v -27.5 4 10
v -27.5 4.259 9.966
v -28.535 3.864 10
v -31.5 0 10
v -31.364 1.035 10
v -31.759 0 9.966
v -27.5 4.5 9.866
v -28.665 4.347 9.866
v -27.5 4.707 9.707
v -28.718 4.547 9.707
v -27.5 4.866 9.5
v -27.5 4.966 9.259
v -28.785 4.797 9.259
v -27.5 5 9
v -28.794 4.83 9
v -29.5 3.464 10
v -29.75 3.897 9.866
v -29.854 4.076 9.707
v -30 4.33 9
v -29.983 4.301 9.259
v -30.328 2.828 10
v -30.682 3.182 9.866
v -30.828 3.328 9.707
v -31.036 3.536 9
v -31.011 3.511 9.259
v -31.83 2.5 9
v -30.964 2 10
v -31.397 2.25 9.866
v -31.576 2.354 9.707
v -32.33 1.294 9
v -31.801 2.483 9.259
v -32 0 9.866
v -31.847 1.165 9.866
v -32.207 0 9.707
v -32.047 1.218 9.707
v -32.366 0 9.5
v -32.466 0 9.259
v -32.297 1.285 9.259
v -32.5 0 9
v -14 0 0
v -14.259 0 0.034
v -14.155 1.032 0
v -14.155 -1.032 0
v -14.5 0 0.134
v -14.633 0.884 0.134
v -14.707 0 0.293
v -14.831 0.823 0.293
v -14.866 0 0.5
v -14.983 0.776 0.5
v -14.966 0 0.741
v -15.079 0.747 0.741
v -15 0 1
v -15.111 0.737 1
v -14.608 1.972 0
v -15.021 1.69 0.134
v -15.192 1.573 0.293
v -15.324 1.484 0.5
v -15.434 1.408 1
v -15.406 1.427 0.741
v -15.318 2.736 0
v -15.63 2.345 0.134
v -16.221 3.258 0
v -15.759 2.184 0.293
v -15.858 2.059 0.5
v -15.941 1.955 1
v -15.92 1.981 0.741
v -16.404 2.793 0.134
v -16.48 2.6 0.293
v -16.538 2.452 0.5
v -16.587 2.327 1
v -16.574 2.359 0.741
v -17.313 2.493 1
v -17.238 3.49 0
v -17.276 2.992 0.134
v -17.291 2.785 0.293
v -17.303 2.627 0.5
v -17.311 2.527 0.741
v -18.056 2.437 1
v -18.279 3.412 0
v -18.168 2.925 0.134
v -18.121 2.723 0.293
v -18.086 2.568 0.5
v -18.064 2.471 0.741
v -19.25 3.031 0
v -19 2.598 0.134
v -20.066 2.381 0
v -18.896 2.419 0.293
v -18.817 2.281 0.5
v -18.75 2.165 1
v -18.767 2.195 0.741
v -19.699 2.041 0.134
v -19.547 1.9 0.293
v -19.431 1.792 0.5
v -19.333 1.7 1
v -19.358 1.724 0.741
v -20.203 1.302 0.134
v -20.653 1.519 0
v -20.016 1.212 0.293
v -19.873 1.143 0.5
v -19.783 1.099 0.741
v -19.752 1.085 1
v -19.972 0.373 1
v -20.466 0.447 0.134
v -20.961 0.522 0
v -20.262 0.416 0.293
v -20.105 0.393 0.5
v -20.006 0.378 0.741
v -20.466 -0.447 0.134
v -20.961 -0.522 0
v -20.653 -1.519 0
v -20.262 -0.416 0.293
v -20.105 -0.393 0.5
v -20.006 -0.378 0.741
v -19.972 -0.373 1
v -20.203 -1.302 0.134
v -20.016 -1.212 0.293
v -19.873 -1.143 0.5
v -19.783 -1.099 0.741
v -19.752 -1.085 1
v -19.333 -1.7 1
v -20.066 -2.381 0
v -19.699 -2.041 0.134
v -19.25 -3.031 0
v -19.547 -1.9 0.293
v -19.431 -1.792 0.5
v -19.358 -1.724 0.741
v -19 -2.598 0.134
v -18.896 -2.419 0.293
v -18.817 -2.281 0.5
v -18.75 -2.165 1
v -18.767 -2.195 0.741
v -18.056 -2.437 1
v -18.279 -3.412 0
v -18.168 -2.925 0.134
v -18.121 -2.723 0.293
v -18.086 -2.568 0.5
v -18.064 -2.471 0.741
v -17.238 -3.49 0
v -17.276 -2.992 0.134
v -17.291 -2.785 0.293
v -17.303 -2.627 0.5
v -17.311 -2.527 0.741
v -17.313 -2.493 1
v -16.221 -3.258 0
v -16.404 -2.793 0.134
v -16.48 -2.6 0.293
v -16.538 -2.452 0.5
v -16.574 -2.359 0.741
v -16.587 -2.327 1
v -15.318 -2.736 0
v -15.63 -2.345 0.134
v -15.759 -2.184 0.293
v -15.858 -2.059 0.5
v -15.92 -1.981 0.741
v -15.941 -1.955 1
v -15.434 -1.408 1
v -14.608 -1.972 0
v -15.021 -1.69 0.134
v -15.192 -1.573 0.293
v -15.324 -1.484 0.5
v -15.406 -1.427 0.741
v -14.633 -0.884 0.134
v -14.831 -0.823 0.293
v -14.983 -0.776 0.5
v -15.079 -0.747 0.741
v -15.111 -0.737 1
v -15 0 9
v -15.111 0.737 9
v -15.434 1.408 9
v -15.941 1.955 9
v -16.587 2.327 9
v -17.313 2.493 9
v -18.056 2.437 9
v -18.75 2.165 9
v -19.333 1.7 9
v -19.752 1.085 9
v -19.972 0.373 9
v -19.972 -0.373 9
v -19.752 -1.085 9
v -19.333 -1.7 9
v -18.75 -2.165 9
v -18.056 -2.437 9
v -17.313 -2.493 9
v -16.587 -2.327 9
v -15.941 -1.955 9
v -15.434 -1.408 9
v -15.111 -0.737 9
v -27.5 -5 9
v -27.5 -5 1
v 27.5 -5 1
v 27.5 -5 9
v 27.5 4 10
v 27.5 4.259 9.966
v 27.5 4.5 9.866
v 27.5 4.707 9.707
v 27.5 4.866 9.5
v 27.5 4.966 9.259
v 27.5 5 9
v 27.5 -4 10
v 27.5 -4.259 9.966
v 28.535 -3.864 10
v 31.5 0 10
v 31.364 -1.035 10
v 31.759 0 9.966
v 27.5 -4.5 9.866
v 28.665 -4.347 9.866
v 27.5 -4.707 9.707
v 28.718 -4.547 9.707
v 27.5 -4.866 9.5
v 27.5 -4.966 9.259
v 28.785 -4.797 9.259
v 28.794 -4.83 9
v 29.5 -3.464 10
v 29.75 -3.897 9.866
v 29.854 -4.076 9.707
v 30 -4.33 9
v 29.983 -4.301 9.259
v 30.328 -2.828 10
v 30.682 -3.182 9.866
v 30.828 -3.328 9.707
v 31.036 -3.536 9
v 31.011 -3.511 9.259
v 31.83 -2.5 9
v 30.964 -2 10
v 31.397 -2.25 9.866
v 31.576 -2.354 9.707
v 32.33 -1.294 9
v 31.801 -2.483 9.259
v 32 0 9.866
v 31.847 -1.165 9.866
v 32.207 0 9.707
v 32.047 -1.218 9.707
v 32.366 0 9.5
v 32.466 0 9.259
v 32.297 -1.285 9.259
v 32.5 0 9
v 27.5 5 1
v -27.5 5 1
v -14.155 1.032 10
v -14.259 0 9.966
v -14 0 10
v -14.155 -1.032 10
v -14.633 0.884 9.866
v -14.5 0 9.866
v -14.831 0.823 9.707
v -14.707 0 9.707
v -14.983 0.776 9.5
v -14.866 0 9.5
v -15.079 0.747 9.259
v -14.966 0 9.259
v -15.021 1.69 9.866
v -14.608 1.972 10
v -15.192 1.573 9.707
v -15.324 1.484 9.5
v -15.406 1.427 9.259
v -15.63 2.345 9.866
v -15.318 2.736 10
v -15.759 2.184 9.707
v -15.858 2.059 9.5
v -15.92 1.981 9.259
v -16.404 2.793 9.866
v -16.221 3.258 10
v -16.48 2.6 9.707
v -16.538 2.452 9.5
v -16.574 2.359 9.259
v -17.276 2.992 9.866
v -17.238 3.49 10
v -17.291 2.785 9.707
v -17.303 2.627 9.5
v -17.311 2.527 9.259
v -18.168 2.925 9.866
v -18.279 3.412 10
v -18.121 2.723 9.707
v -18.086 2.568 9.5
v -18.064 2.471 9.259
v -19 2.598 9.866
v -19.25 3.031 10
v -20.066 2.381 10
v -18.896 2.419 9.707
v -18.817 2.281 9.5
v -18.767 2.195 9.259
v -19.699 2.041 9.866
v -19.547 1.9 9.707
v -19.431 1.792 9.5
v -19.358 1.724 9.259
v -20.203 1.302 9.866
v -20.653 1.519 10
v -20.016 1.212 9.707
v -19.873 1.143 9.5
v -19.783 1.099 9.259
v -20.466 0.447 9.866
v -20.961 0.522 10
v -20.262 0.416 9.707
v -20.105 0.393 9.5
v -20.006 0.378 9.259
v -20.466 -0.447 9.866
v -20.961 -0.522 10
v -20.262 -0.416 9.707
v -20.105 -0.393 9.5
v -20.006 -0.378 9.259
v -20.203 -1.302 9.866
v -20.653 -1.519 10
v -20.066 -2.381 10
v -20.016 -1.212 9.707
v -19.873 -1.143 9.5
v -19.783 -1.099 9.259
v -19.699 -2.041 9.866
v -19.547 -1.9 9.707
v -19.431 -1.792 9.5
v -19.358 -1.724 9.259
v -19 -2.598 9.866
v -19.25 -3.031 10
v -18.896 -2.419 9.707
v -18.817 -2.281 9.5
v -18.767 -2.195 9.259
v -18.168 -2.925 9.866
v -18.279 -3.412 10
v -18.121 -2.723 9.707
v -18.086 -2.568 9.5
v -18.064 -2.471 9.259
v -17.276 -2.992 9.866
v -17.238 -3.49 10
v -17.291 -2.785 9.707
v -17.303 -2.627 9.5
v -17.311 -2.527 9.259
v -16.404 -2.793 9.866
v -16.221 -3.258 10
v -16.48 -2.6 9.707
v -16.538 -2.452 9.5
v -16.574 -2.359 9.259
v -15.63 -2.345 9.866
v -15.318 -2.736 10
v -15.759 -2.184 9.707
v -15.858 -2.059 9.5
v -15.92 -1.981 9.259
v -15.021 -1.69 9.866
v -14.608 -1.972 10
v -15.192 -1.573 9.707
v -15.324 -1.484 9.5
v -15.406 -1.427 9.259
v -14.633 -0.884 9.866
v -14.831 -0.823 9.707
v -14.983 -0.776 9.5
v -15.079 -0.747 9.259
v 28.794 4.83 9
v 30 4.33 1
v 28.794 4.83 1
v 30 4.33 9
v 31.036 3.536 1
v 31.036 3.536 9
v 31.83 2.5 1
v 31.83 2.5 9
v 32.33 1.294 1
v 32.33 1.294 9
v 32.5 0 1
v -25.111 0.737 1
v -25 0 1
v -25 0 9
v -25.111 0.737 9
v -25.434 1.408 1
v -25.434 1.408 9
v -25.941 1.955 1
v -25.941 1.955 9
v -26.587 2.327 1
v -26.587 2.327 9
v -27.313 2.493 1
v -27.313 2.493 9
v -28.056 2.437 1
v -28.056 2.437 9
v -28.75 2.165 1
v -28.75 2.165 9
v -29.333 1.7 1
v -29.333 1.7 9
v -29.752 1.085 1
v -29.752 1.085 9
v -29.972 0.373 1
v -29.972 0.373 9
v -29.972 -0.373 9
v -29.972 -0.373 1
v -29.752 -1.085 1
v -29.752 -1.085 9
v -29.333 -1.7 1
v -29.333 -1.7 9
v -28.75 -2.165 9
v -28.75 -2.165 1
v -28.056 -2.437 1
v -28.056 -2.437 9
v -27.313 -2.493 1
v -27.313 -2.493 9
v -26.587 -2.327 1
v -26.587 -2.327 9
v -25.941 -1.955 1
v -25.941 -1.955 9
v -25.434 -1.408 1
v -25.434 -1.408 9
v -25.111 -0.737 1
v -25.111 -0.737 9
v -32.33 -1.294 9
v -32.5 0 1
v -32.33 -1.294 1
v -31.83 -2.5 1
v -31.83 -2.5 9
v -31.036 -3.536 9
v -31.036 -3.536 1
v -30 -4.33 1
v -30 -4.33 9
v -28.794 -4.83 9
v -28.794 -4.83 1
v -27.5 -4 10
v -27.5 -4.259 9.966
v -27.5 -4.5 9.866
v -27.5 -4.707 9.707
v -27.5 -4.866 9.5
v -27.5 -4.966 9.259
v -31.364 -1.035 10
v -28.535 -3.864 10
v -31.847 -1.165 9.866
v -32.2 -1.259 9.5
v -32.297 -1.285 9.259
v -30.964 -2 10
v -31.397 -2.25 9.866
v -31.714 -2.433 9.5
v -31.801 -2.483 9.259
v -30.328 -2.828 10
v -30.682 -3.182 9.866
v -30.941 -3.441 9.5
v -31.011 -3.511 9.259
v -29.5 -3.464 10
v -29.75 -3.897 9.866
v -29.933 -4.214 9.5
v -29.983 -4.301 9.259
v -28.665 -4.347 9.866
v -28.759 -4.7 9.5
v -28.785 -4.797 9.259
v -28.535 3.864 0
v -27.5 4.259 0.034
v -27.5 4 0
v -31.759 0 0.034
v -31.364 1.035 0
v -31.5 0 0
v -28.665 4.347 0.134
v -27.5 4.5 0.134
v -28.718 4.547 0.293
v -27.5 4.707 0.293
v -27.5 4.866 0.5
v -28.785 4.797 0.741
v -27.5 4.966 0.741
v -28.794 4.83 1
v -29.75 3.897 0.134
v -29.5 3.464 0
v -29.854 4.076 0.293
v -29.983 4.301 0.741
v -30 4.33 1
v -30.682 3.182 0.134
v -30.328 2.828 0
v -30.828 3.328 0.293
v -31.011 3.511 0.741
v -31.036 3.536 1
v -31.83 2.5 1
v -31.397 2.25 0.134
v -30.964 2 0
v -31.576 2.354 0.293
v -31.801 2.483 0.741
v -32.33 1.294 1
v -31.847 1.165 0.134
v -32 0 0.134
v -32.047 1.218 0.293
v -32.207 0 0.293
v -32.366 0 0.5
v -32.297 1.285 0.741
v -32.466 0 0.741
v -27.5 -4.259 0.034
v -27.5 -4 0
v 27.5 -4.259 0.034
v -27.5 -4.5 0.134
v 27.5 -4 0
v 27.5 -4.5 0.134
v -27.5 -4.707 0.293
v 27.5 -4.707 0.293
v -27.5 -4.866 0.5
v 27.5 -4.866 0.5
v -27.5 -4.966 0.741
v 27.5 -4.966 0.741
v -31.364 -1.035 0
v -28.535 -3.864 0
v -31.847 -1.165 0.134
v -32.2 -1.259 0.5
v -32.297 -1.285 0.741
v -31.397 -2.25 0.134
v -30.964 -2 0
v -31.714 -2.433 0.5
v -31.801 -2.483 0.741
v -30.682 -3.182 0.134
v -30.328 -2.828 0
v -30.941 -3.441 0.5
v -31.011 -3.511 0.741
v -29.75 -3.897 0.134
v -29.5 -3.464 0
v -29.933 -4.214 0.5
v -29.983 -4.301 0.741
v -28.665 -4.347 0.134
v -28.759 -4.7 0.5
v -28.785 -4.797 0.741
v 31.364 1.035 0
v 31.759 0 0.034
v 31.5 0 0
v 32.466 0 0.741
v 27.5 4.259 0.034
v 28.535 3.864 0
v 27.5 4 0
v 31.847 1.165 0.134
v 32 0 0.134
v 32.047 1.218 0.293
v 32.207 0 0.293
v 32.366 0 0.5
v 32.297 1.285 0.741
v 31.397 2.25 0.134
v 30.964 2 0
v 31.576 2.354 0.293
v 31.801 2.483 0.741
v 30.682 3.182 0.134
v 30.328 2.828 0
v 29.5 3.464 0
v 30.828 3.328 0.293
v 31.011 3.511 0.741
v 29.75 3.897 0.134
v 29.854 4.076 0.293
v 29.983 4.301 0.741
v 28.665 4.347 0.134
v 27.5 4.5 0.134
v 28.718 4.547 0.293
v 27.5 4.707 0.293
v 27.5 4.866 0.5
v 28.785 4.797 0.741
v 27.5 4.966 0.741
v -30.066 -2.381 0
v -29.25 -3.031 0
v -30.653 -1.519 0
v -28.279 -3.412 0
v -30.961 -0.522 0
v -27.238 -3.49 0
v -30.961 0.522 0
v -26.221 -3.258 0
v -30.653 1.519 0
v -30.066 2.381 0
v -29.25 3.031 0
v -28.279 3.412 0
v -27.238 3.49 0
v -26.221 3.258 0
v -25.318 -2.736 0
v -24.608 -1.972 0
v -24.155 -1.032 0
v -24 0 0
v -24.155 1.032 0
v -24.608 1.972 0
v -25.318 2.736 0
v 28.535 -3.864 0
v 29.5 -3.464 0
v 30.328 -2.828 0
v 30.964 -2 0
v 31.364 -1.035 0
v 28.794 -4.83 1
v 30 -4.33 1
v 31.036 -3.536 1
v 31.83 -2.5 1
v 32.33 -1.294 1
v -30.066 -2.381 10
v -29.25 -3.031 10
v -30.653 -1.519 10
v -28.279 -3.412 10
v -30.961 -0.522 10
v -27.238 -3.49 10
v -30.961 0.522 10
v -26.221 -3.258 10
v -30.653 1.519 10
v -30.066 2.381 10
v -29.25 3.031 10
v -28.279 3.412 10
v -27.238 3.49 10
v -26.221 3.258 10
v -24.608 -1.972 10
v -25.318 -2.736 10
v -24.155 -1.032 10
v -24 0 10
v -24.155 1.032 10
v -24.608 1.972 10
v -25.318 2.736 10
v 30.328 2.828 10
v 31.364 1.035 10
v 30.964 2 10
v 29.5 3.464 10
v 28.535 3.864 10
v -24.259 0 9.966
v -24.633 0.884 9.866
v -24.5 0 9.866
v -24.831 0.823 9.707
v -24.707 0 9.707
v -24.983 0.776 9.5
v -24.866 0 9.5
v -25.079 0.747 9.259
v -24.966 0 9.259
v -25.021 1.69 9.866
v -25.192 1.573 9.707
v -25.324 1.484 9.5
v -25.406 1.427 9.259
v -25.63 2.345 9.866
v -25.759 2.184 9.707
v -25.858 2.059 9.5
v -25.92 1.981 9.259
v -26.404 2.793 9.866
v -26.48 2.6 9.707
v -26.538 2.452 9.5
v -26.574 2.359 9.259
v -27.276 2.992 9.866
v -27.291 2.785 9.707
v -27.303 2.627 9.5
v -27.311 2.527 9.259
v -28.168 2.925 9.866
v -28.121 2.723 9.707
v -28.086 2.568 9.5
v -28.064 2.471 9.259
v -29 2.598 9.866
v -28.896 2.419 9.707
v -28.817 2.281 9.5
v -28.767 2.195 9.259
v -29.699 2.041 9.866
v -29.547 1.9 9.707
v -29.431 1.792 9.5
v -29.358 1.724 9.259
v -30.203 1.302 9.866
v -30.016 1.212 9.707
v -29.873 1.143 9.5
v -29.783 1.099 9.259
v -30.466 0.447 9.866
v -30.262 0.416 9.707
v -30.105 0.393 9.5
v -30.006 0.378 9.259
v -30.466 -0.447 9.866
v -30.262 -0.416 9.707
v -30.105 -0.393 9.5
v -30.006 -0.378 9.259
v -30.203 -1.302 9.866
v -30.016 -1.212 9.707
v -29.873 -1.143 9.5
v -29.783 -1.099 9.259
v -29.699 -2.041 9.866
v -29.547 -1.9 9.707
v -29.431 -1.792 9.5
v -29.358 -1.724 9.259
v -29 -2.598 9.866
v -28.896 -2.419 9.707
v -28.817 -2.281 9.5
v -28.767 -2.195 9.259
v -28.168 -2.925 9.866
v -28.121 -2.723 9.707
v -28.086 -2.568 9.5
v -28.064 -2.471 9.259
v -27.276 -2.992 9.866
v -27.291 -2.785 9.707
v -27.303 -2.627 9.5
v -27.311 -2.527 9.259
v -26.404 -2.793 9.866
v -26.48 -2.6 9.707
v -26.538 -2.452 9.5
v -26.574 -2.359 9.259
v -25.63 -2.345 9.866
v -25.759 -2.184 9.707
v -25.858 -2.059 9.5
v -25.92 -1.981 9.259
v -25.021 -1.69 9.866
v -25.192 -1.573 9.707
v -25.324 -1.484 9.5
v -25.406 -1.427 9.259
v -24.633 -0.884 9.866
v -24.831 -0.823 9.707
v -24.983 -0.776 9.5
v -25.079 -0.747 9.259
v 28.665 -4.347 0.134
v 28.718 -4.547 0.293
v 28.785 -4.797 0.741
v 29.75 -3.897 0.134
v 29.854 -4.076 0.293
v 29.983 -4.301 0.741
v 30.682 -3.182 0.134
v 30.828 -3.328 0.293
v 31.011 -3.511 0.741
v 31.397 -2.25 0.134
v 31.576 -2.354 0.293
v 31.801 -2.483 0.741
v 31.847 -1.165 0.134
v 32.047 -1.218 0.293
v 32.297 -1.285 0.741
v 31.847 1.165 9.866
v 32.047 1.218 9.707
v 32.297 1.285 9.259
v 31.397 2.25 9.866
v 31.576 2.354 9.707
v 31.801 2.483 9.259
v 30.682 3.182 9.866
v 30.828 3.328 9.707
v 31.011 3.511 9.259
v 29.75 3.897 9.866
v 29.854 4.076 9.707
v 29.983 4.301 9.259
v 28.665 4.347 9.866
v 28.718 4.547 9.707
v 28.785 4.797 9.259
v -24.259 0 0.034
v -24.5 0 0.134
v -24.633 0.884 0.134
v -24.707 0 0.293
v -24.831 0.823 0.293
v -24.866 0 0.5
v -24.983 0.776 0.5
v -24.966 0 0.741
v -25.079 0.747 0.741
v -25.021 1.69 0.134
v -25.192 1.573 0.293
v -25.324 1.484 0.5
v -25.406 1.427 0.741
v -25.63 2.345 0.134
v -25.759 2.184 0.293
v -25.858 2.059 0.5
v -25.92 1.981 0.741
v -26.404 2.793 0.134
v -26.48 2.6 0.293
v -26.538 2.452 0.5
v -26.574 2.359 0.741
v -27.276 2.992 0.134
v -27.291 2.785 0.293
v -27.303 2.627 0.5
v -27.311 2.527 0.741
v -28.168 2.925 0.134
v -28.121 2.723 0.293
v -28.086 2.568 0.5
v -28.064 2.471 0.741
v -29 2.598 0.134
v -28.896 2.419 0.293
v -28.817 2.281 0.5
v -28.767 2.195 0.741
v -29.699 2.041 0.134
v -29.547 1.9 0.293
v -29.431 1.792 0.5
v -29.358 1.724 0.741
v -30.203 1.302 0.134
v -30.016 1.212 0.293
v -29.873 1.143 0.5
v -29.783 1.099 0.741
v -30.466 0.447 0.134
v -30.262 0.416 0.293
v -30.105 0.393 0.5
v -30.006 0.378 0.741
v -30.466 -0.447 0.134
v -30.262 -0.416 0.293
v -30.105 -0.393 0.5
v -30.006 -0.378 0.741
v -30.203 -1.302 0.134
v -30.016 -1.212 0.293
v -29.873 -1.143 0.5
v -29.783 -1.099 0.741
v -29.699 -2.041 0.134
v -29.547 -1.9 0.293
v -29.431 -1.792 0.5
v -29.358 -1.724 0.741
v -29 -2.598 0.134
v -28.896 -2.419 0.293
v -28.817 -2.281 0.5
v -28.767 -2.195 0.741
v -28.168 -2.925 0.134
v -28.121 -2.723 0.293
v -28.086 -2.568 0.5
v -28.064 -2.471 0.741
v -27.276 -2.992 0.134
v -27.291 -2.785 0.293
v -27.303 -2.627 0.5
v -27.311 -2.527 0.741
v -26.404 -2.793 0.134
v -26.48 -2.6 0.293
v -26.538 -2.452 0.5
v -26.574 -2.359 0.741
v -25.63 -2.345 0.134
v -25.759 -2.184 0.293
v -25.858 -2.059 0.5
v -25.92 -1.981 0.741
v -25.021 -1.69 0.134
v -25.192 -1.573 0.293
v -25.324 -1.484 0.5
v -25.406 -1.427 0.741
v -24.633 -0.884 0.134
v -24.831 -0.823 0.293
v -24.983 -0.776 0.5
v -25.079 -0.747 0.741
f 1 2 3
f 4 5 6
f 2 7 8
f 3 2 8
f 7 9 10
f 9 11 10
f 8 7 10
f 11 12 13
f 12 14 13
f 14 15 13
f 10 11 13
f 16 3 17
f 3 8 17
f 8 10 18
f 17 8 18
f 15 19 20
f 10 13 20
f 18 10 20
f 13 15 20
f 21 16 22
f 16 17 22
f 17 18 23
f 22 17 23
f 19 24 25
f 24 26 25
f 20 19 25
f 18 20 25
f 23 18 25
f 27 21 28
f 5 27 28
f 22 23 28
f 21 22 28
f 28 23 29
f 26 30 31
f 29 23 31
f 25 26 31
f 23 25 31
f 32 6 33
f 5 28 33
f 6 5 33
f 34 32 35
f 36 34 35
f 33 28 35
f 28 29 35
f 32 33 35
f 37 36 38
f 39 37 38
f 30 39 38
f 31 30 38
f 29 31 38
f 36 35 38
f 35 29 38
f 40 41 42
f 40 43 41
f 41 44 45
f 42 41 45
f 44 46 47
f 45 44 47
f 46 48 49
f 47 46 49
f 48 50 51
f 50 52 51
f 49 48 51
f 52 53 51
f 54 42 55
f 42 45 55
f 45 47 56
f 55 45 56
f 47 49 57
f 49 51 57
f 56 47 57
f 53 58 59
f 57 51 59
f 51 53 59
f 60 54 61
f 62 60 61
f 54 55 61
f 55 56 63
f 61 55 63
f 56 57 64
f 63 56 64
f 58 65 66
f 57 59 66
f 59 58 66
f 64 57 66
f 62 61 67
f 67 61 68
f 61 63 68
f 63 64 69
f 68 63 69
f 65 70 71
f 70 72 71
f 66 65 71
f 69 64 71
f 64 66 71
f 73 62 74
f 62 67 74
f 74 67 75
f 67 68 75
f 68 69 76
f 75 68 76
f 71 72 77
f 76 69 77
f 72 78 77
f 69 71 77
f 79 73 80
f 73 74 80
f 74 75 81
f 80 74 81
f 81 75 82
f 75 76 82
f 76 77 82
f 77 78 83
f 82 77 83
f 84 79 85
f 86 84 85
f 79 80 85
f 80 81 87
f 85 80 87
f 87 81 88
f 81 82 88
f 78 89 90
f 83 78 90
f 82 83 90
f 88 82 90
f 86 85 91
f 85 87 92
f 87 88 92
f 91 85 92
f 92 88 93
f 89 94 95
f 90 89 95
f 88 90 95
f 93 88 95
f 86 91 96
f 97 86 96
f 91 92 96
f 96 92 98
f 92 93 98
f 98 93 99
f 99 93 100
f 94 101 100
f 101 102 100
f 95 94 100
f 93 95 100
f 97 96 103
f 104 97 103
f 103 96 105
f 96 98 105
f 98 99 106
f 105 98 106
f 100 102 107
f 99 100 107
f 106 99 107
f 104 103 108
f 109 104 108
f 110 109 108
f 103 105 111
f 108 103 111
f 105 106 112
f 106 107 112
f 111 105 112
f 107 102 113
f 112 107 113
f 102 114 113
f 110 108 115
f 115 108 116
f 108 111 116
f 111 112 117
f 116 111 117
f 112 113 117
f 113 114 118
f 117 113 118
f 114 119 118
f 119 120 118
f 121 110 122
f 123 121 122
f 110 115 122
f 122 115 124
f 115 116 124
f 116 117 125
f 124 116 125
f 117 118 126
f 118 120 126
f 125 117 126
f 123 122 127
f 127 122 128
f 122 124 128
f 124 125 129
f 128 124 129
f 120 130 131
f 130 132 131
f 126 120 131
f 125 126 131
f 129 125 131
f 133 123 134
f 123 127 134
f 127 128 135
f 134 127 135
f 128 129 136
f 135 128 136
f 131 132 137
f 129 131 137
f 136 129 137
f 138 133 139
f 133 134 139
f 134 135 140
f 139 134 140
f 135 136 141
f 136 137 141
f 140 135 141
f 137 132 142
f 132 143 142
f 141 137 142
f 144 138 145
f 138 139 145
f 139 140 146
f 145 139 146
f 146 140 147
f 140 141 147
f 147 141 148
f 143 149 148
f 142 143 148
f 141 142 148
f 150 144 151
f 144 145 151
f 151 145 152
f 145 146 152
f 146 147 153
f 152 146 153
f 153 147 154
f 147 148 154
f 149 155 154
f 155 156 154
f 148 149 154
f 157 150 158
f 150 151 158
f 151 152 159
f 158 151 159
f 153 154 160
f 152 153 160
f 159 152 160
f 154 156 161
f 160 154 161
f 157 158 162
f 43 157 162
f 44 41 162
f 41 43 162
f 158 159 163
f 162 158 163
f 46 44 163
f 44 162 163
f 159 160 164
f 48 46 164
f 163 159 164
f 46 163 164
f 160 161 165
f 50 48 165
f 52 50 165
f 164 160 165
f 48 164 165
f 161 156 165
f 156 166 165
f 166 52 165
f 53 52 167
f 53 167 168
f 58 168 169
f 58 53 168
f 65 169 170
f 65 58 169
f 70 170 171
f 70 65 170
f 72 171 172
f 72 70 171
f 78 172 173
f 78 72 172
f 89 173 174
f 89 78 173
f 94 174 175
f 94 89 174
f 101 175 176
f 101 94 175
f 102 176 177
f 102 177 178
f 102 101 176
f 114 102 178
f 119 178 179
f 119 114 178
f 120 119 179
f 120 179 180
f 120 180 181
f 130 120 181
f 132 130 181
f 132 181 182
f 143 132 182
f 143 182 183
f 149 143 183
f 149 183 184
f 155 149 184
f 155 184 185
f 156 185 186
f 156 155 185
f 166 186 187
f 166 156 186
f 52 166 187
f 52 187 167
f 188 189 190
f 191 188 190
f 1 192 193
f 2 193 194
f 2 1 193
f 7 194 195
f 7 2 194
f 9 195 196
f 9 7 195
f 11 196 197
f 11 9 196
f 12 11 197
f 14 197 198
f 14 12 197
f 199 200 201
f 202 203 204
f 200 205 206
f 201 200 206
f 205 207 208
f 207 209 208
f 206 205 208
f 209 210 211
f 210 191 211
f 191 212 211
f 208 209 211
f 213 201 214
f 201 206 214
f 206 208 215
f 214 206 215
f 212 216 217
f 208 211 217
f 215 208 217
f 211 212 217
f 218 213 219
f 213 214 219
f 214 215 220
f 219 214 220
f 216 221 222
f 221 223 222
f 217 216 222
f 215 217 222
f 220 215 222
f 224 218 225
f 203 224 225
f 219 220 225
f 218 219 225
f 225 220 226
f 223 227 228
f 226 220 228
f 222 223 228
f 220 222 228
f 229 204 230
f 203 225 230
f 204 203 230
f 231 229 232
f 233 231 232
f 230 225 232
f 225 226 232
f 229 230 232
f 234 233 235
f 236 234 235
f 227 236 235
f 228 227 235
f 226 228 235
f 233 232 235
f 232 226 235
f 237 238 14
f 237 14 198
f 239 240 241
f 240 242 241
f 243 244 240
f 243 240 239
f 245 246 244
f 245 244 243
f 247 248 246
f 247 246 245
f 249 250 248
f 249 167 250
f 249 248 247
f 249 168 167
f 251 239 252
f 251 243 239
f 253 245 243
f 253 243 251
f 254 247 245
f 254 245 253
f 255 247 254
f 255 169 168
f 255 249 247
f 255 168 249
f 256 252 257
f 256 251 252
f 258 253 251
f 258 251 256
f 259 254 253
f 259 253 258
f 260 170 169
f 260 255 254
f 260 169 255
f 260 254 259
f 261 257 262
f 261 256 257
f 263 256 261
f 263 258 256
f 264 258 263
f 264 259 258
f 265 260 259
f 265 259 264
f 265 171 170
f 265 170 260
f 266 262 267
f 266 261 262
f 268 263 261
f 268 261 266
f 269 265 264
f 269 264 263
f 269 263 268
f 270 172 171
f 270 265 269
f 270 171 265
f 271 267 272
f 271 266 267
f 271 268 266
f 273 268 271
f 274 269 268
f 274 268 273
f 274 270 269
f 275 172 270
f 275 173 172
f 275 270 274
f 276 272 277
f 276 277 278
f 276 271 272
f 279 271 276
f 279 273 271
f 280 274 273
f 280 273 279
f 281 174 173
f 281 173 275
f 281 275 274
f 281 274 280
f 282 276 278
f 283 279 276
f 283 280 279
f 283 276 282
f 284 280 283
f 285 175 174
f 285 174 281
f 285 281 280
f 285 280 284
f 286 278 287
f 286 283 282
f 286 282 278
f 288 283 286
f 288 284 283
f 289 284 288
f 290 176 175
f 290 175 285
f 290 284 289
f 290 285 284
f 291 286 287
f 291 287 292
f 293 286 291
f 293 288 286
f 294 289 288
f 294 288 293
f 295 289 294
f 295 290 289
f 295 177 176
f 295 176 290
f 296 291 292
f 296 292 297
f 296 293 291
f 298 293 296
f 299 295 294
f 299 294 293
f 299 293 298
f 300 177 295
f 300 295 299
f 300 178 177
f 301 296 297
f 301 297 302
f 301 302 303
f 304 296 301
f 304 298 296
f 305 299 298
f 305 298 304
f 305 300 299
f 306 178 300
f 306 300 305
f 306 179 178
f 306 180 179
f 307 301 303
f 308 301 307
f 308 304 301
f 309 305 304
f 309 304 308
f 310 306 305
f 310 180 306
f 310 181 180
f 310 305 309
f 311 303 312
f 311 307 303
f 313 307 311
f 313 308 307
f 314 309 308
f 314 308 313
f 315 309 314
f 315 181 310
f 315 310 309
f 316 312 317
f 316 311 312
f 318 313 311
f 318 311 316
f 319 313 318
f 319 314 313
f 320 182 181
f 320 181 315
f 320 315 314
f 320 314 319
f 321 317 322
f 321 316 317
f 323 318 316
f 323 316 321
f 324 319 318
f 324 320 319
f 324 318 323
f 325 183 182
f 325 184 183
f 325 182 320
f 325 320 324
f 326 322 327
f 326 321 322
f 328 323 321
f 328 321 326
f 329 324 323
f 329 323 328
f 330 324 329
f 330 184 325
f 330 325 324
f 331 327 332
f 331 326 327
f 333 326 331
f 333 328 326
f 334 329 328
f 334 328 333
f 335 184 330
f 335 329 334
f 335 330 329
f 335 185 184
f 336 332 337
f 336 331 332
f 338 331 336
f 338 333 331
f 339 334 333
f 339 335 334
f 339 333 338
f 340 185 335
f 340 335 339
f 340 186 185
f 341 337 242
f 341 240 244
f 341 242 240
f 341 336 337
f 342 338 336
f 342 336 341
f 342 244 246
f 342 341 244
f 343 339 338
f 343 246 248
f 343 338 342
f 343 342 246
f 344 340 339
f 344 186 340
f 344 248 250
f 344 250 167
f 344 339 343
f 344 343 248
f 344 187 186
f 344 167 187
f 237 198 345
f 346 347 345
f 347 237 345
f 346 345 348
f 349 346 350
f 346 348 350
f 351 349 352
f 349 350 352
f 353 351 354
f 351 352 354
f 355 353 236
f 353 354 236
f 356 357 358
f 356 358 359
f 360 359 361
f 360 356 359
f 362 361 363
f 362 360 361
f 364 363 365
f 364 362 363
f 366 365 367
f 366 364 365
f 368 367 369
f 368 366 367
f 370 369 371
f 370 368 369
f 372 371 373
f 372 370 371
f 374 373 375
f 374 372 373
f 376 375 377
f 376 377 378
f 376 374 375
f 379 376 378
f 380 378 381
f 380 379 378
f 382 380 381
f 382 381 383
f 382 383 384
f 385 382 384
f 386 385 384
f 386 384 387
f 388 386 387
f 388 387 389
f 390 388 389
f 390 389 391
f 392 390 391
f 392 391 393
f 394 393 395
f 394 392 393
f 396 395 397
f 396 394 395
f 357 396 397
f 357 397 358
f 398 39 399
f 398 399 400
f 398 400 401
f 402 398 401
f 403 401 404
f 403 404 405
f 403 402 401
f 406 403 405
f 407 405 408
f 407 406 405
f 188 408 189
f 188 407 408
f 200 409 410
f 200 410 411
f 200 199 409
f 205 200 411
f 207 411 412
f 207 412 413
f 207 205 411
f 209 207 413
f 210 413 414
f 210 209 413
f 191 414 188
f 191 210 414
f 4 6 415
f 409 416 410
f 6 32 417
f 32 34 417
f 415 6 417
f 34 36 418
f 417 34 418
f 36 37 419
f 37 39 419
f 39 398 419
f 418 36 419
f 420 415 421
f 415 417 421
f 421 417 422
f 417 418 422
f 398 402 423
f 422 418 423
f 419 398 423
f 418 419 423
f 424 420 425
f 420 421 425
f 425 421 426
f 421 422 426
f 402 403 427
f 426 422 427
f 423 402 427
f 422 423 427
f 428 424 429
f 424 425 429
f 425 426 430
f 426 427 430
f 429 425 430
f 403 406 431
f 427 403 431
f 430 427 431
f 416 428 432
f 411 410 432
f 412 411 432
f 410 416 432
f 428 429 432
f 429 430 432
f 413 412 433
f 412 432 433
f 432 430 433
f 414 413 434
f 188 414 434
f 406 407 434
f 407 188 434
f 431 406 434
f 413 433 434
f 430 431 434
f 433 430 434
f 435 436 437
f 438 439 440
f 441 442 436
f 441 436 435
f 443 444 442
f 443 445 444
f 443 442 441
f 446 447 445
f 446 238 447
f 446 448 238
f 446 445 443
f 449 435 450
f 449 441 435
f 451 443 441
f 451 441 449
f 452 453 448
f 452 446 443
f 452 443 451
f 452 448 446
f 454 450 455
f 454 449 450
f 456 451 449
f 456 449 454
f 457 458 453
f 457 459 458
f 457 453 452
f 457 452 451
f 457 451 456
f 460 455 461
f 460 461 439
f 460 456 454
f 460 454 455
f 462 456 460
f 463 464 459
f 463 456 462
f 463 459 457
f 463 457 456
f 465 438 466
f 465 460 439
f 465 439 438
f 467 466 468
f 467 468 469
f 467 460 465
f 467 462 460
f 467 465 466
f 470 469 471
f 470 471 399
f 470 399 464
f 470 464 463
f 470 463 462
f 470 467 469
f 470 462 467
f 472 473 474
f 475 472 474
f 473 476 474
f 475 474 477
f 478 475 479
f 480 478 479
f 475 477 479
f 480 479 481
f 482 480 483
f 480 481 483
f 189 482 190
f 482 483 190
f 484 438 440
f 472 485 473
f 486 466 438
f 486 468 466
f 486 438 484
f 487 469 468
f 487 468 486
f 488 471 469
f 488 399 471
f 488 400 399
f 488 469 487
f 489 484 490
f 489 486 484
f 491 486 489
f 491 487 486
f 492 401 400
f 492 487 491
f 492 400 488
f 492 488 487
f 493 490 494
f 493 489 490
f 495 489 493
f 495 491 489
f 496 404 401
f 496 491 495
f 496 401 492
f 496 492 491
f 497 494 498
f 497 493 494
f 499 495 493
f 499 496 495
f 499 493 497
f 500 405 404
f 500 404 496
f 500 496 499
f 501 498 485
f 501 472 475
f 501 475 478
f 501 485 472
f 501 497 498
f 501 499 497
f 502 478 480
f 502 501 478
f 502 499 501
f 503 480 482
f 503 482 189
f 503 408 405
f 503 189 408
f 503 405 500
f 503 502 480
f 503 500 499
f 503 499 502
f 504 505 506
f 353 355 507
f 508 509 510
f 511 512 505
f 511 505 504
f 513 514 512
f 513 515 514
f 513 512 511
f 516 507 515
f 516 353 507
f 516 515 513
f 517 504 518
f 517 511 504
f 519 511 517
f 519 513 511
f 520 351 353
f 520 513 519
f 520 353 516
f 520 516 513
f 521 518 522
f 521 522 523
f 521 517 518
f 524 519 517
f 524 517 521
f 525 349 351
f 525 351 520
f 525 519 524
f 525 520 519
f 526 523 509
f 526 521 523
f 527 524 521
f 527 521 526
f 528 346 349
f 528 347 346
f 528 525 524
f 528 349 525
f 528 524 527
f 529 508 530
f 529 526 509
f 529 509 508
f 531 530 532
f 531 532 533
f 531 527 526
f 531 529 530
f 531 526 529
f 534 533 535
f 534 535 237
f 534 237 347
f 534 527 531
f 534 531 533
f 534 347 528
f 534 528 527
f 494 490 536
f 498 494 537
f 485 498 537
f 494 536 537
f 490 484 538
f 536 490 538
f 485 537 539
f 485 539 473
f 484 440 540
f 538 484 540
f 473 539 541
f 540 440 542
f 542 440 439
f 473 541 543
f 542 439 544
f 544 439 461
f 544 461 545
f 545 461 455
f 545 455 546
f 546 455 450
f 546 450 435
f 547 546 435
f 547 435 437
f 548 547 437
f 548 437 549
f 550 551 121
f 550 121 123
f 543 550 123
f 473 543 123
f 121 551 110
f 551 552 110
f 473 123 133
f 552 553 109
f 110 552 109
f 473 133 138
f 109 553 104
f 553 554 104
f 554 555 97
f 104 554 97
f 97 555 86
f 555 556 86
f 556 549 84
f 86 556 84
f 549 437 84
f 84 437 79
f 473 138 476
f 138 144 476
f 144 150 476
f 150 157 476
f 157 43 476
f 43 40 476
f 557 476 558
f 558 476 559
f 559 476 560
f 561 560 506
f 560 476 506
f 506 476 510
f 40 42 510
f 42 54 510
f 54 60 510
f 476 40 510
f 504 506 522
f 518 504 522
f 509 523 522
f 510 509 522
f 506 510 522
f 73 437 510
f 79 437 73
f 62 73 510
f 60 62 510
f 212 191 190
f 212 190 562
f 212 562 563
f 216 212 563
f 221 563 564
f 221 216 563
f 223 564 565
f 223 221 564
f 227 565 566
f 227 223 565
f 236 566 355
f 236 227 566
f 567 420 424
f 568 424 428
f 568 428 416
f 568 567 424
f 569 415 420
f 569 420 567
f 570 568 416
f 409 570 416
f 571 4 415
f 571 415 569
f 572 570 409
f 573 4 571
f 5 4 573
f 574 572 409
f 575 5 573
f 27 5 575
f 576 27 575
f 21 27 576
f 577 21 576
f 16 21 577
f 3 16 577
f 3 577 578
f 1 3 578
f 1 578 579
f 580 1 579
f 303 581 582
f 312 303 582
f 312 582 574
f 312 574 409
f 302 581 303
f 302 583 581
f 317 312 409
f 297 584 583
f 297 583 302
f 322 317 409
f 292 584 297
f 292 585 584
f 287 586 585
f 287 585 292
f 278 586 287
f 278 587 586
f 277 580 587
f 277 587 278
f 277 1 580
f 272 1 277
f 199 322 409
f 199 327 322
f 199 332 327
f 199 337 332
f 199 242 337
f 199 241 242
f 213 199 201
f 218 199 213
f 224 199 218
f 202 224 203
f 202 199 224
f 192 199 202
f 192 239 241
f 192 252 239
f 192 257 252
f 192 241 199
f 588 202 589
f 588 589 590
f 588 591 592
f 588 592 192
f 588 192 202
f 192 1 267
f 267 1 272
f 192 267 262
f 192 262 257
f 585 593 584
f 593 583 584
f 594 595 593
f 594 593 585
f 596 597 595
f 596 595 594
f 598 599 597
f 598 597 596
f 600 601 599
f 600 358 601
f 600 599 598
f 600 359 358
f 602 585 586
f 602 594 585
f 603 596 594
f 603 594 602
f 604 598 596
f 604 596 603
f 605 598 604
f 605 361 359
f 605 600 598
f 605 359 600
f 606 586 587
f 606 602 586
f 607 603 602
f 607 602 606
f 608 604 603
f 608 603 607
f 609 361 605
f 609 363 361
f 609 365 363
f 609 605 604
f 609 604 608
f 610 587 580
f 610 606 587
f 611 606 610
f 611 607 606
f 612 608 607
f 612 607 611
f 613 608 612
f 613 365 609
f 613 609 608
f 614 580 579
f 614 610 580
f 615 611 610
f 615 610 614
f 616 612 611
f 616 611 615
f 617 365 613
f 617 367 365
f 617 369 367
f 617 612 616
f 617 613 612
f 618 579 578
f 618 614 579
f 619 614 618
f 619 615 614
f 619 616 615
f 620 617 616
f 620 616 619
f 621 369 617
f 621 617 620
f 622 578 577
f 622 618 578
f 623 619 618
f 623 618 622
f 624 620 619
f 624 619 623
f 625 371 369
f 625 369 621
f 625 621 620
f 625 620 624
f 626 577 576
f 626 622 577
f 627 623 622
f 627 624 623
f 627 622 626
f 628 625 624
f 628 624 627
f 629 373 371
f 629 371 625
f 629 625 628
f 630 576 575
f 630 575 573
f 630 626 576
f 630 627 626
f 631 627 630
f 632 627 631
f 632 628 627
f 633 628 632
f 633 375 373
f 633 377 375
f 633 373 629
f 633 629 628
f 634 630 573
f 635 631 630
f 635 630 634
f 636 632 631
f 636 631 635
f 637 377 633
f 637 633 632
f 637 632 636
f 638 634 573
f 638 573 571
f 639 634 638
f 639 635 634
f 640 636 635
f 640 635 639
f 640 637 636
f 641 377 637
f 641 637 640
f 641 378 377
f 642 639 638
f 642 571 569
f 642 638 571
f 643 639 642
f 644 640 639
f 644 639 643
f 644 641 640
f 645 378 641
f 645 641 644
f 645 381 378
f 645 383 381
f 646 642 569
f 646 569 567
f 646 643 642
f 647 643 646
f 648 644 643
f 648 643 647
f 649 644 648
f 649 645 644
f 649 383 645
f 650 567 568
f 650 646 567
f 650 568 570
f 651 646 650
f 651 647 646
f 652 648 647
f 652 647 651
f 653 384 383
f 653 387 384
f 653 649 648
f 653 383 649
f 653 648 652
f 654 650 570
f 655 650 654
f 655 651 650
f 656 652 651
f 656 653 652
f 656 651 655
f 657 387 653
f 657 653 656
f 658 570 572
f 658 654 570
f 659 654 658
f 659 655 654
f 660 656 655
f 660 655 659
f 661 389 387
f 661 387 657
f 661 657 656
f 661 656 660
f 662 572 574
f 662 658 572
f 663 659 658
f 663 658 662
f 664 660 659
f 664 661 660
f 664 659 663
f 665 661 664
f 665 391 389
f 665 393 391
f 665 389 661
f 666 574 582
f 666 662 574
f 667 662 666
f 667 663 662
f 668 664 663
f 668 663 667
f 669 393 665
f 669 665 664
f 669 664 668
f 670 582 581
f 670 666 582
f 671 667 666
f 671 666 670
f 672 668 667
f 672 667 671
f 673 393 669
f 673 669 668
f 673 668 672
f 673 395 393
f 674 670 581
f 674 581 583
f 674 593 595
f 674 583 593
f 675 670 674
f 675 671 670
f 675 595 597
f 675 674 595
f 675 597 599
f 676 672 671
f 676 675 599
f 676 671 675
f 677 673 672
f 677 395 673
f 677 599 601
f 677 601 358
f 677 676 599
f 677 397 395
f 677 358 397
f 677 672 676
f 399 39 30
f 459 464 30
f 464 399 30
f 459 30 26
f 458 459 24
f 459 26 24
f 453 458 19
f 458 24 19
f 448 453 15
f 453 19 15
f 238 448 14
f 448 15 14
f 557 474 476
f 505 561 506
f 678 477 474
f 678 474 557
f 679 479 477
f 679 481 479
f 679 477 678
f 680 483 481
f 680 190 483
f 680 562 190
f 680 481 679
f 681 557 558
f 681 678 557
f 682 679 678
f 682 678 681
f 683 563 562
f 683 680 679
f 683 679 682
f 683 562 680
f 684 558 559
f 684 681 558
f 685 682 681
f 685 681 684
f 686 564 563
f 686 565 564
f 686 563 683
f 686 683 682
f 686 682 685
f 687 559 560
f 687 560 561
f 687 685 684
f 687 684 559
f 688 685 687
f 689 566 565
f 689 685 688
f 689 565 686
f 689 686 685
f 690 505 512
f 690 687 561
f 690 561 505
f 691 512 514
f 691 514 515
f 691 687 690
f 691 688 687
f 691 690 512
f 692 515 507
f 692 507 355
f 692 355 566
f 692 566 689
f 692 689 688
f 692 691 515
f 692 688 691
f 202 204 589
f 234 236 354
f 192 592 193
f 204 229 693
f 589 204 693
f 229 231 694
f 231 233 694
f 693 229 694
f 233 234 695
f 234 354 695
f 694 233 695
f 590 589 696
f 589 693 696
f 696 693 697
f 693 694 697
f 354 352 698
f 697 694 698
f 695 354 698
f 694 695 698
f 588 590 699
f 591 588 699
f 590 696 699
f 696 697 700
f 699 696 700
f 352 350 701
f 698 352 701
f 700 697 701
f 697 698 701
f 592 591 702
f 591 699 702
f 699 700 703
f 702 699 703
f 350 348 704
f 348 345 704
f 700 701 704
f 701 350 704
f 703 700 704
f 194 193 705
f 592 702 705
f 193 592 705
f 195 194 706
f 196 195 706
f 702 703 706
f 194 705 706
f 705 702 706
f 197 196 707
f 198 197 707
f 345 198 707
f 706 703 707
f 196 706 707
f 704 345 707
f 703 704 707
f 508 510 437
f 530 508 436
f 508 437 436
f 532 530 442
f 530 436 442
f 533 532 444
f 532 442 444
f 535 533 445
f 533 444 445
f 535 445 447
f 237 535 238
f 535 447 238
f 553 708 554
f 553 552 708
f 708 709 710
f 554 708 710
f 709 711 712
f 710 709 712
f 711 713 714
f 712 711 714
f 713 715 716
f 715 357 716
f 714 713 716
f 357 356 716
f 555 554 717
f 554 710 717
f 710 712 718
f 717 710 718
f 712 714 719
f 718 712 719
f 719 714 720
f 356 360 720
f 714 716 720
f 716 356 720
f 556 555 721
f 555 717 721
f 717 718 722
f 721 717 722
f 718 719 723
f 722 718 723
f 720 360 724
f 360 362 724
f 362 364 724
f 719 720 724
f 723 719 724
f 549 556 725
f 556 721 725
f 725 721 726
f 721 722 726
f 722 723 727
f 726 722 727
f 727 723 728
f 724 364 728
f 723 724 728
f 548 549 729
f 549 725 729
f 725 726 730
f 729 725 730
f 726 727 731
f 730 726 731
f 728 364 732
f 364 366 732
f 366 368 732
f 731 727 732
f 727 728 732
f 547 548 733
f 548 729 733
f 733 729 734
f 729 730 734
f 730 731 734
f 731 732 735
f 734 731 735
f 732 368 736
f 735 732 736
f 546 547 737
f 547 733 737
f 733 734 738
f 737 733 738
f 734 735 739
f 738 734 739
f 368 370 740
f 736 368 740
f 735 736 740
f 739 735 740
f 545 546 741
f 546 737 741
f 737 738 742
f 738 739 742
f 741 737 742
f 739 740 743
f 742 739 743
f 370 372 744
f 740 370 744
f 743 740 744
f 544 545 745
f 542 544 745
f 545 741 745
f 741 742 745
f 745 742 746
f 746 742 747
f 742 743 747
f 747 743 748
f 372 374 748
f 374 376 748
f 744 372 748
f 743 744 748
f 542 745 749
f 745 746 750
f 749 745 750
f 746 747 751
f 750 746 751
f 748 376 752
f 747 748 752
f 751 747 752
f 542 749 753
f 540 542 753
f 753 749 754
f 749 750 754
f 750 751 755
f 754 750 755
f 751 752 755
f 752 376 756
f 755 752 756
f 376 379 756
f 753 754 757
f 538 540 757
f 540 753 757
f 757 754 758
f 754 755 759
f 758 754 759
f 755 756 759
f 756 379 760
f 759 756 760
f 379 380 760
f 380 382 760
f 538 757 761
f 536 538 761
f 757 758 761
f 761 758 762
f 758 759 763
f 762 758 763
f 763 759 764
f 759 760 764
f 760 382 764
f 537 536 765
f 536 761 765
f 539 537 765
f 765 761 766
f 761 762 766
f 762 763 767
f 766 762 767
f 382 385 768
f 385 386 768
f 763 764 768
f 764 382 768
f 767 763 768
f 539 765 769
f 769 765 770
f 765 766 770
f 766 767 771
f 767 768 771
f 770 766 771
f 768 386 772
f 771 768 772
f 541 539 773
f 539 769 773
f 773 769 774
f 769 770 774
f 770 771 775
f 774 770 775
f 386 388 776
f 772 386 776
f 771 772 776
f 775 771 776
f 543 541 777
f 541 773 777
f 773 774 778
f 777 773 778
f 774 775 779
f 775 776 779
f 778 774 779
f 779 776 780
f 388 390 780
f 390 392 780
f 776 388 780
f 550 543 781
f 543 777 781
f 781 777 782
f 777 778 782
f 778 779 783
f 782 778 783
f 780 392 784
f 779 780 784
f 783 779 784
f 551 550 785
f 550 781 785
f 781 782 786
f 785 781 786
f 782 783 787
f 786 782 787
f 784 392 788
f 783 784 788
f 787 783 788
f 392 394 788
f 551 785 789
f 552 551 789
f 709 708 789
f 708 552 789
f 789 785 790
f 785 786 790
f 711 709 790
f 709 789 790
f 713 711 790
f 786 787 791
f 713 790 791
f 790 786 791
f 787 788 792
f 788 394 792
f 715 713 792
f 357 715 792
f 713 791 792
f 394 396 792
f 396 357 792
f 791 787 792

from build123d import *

# Parameters (mm, degrees)
SKETCH1_W           = 65
SKETCH1_H           = 10
SKETCH1_R           = 2.5
BOSS_EXTRUDE1_DEPTH = 10
FILLET1_R           = 5
FILLET2_R           = 1


with BuildPart() as part:
    # Sketch1 → Boss-Extrude1 (new body)
    with BuildSketch(Plane.XY):
        Rectangle(SKETCH1_W, SKETCH1_H)
        with Locations((-27.5, 0)):
            Circle(SKETCH1_R, mode=Mode.SUBTRACT)
        with Locations((-17.5, 0)):
            Circle(SKETCH1_R, mode=Mode.SUBTRACT)
    extrude(amount=BOSS_EXTRUDE1_DEPTH)

    # Fillet1
    fillet1_edges = [part.edges().sort_by_distance(p)[0] for p in [
        (32.5, -5, 5),
        (32.5, 5, 5),
        (-32.5, 5, 5),
        (-32.5, -5, 5),
    ]]
    fillet(fillet1_edges, radius=FILLET1_R - 0.0001)  # a hair under: the kernel refuses the full size

    # Fillet2
    fillet2_edges = [part.edges().sort_by_distance(p)[0] for p in [
        (-30, 0, 0),
        (-30, 0, 10),
        (-20, 0, 0),
        (-20, 0, 10),
        (0, -5, 0),
        (0, 5, 0),
        (-31.035563195, -3.535563195, 0),
        (-31.035563195, 3.535563195, 0),
        (31.035563195, 3.535563195, 0),
        (31.035563195, -3.535563195, 0),
        (0, -5, 10),
        (0, 5, 10),
        (-31.035563195, -3.535563195, 10),
        (-31.035563195, 3.535563195, 10),
        (31.035563195, 3.535563195, 10),
        (31.035563195, -3.535563195, 10),
    ]]
    fillet(fillet2_edges, radius=FILLET2_R)


solid = part.part
